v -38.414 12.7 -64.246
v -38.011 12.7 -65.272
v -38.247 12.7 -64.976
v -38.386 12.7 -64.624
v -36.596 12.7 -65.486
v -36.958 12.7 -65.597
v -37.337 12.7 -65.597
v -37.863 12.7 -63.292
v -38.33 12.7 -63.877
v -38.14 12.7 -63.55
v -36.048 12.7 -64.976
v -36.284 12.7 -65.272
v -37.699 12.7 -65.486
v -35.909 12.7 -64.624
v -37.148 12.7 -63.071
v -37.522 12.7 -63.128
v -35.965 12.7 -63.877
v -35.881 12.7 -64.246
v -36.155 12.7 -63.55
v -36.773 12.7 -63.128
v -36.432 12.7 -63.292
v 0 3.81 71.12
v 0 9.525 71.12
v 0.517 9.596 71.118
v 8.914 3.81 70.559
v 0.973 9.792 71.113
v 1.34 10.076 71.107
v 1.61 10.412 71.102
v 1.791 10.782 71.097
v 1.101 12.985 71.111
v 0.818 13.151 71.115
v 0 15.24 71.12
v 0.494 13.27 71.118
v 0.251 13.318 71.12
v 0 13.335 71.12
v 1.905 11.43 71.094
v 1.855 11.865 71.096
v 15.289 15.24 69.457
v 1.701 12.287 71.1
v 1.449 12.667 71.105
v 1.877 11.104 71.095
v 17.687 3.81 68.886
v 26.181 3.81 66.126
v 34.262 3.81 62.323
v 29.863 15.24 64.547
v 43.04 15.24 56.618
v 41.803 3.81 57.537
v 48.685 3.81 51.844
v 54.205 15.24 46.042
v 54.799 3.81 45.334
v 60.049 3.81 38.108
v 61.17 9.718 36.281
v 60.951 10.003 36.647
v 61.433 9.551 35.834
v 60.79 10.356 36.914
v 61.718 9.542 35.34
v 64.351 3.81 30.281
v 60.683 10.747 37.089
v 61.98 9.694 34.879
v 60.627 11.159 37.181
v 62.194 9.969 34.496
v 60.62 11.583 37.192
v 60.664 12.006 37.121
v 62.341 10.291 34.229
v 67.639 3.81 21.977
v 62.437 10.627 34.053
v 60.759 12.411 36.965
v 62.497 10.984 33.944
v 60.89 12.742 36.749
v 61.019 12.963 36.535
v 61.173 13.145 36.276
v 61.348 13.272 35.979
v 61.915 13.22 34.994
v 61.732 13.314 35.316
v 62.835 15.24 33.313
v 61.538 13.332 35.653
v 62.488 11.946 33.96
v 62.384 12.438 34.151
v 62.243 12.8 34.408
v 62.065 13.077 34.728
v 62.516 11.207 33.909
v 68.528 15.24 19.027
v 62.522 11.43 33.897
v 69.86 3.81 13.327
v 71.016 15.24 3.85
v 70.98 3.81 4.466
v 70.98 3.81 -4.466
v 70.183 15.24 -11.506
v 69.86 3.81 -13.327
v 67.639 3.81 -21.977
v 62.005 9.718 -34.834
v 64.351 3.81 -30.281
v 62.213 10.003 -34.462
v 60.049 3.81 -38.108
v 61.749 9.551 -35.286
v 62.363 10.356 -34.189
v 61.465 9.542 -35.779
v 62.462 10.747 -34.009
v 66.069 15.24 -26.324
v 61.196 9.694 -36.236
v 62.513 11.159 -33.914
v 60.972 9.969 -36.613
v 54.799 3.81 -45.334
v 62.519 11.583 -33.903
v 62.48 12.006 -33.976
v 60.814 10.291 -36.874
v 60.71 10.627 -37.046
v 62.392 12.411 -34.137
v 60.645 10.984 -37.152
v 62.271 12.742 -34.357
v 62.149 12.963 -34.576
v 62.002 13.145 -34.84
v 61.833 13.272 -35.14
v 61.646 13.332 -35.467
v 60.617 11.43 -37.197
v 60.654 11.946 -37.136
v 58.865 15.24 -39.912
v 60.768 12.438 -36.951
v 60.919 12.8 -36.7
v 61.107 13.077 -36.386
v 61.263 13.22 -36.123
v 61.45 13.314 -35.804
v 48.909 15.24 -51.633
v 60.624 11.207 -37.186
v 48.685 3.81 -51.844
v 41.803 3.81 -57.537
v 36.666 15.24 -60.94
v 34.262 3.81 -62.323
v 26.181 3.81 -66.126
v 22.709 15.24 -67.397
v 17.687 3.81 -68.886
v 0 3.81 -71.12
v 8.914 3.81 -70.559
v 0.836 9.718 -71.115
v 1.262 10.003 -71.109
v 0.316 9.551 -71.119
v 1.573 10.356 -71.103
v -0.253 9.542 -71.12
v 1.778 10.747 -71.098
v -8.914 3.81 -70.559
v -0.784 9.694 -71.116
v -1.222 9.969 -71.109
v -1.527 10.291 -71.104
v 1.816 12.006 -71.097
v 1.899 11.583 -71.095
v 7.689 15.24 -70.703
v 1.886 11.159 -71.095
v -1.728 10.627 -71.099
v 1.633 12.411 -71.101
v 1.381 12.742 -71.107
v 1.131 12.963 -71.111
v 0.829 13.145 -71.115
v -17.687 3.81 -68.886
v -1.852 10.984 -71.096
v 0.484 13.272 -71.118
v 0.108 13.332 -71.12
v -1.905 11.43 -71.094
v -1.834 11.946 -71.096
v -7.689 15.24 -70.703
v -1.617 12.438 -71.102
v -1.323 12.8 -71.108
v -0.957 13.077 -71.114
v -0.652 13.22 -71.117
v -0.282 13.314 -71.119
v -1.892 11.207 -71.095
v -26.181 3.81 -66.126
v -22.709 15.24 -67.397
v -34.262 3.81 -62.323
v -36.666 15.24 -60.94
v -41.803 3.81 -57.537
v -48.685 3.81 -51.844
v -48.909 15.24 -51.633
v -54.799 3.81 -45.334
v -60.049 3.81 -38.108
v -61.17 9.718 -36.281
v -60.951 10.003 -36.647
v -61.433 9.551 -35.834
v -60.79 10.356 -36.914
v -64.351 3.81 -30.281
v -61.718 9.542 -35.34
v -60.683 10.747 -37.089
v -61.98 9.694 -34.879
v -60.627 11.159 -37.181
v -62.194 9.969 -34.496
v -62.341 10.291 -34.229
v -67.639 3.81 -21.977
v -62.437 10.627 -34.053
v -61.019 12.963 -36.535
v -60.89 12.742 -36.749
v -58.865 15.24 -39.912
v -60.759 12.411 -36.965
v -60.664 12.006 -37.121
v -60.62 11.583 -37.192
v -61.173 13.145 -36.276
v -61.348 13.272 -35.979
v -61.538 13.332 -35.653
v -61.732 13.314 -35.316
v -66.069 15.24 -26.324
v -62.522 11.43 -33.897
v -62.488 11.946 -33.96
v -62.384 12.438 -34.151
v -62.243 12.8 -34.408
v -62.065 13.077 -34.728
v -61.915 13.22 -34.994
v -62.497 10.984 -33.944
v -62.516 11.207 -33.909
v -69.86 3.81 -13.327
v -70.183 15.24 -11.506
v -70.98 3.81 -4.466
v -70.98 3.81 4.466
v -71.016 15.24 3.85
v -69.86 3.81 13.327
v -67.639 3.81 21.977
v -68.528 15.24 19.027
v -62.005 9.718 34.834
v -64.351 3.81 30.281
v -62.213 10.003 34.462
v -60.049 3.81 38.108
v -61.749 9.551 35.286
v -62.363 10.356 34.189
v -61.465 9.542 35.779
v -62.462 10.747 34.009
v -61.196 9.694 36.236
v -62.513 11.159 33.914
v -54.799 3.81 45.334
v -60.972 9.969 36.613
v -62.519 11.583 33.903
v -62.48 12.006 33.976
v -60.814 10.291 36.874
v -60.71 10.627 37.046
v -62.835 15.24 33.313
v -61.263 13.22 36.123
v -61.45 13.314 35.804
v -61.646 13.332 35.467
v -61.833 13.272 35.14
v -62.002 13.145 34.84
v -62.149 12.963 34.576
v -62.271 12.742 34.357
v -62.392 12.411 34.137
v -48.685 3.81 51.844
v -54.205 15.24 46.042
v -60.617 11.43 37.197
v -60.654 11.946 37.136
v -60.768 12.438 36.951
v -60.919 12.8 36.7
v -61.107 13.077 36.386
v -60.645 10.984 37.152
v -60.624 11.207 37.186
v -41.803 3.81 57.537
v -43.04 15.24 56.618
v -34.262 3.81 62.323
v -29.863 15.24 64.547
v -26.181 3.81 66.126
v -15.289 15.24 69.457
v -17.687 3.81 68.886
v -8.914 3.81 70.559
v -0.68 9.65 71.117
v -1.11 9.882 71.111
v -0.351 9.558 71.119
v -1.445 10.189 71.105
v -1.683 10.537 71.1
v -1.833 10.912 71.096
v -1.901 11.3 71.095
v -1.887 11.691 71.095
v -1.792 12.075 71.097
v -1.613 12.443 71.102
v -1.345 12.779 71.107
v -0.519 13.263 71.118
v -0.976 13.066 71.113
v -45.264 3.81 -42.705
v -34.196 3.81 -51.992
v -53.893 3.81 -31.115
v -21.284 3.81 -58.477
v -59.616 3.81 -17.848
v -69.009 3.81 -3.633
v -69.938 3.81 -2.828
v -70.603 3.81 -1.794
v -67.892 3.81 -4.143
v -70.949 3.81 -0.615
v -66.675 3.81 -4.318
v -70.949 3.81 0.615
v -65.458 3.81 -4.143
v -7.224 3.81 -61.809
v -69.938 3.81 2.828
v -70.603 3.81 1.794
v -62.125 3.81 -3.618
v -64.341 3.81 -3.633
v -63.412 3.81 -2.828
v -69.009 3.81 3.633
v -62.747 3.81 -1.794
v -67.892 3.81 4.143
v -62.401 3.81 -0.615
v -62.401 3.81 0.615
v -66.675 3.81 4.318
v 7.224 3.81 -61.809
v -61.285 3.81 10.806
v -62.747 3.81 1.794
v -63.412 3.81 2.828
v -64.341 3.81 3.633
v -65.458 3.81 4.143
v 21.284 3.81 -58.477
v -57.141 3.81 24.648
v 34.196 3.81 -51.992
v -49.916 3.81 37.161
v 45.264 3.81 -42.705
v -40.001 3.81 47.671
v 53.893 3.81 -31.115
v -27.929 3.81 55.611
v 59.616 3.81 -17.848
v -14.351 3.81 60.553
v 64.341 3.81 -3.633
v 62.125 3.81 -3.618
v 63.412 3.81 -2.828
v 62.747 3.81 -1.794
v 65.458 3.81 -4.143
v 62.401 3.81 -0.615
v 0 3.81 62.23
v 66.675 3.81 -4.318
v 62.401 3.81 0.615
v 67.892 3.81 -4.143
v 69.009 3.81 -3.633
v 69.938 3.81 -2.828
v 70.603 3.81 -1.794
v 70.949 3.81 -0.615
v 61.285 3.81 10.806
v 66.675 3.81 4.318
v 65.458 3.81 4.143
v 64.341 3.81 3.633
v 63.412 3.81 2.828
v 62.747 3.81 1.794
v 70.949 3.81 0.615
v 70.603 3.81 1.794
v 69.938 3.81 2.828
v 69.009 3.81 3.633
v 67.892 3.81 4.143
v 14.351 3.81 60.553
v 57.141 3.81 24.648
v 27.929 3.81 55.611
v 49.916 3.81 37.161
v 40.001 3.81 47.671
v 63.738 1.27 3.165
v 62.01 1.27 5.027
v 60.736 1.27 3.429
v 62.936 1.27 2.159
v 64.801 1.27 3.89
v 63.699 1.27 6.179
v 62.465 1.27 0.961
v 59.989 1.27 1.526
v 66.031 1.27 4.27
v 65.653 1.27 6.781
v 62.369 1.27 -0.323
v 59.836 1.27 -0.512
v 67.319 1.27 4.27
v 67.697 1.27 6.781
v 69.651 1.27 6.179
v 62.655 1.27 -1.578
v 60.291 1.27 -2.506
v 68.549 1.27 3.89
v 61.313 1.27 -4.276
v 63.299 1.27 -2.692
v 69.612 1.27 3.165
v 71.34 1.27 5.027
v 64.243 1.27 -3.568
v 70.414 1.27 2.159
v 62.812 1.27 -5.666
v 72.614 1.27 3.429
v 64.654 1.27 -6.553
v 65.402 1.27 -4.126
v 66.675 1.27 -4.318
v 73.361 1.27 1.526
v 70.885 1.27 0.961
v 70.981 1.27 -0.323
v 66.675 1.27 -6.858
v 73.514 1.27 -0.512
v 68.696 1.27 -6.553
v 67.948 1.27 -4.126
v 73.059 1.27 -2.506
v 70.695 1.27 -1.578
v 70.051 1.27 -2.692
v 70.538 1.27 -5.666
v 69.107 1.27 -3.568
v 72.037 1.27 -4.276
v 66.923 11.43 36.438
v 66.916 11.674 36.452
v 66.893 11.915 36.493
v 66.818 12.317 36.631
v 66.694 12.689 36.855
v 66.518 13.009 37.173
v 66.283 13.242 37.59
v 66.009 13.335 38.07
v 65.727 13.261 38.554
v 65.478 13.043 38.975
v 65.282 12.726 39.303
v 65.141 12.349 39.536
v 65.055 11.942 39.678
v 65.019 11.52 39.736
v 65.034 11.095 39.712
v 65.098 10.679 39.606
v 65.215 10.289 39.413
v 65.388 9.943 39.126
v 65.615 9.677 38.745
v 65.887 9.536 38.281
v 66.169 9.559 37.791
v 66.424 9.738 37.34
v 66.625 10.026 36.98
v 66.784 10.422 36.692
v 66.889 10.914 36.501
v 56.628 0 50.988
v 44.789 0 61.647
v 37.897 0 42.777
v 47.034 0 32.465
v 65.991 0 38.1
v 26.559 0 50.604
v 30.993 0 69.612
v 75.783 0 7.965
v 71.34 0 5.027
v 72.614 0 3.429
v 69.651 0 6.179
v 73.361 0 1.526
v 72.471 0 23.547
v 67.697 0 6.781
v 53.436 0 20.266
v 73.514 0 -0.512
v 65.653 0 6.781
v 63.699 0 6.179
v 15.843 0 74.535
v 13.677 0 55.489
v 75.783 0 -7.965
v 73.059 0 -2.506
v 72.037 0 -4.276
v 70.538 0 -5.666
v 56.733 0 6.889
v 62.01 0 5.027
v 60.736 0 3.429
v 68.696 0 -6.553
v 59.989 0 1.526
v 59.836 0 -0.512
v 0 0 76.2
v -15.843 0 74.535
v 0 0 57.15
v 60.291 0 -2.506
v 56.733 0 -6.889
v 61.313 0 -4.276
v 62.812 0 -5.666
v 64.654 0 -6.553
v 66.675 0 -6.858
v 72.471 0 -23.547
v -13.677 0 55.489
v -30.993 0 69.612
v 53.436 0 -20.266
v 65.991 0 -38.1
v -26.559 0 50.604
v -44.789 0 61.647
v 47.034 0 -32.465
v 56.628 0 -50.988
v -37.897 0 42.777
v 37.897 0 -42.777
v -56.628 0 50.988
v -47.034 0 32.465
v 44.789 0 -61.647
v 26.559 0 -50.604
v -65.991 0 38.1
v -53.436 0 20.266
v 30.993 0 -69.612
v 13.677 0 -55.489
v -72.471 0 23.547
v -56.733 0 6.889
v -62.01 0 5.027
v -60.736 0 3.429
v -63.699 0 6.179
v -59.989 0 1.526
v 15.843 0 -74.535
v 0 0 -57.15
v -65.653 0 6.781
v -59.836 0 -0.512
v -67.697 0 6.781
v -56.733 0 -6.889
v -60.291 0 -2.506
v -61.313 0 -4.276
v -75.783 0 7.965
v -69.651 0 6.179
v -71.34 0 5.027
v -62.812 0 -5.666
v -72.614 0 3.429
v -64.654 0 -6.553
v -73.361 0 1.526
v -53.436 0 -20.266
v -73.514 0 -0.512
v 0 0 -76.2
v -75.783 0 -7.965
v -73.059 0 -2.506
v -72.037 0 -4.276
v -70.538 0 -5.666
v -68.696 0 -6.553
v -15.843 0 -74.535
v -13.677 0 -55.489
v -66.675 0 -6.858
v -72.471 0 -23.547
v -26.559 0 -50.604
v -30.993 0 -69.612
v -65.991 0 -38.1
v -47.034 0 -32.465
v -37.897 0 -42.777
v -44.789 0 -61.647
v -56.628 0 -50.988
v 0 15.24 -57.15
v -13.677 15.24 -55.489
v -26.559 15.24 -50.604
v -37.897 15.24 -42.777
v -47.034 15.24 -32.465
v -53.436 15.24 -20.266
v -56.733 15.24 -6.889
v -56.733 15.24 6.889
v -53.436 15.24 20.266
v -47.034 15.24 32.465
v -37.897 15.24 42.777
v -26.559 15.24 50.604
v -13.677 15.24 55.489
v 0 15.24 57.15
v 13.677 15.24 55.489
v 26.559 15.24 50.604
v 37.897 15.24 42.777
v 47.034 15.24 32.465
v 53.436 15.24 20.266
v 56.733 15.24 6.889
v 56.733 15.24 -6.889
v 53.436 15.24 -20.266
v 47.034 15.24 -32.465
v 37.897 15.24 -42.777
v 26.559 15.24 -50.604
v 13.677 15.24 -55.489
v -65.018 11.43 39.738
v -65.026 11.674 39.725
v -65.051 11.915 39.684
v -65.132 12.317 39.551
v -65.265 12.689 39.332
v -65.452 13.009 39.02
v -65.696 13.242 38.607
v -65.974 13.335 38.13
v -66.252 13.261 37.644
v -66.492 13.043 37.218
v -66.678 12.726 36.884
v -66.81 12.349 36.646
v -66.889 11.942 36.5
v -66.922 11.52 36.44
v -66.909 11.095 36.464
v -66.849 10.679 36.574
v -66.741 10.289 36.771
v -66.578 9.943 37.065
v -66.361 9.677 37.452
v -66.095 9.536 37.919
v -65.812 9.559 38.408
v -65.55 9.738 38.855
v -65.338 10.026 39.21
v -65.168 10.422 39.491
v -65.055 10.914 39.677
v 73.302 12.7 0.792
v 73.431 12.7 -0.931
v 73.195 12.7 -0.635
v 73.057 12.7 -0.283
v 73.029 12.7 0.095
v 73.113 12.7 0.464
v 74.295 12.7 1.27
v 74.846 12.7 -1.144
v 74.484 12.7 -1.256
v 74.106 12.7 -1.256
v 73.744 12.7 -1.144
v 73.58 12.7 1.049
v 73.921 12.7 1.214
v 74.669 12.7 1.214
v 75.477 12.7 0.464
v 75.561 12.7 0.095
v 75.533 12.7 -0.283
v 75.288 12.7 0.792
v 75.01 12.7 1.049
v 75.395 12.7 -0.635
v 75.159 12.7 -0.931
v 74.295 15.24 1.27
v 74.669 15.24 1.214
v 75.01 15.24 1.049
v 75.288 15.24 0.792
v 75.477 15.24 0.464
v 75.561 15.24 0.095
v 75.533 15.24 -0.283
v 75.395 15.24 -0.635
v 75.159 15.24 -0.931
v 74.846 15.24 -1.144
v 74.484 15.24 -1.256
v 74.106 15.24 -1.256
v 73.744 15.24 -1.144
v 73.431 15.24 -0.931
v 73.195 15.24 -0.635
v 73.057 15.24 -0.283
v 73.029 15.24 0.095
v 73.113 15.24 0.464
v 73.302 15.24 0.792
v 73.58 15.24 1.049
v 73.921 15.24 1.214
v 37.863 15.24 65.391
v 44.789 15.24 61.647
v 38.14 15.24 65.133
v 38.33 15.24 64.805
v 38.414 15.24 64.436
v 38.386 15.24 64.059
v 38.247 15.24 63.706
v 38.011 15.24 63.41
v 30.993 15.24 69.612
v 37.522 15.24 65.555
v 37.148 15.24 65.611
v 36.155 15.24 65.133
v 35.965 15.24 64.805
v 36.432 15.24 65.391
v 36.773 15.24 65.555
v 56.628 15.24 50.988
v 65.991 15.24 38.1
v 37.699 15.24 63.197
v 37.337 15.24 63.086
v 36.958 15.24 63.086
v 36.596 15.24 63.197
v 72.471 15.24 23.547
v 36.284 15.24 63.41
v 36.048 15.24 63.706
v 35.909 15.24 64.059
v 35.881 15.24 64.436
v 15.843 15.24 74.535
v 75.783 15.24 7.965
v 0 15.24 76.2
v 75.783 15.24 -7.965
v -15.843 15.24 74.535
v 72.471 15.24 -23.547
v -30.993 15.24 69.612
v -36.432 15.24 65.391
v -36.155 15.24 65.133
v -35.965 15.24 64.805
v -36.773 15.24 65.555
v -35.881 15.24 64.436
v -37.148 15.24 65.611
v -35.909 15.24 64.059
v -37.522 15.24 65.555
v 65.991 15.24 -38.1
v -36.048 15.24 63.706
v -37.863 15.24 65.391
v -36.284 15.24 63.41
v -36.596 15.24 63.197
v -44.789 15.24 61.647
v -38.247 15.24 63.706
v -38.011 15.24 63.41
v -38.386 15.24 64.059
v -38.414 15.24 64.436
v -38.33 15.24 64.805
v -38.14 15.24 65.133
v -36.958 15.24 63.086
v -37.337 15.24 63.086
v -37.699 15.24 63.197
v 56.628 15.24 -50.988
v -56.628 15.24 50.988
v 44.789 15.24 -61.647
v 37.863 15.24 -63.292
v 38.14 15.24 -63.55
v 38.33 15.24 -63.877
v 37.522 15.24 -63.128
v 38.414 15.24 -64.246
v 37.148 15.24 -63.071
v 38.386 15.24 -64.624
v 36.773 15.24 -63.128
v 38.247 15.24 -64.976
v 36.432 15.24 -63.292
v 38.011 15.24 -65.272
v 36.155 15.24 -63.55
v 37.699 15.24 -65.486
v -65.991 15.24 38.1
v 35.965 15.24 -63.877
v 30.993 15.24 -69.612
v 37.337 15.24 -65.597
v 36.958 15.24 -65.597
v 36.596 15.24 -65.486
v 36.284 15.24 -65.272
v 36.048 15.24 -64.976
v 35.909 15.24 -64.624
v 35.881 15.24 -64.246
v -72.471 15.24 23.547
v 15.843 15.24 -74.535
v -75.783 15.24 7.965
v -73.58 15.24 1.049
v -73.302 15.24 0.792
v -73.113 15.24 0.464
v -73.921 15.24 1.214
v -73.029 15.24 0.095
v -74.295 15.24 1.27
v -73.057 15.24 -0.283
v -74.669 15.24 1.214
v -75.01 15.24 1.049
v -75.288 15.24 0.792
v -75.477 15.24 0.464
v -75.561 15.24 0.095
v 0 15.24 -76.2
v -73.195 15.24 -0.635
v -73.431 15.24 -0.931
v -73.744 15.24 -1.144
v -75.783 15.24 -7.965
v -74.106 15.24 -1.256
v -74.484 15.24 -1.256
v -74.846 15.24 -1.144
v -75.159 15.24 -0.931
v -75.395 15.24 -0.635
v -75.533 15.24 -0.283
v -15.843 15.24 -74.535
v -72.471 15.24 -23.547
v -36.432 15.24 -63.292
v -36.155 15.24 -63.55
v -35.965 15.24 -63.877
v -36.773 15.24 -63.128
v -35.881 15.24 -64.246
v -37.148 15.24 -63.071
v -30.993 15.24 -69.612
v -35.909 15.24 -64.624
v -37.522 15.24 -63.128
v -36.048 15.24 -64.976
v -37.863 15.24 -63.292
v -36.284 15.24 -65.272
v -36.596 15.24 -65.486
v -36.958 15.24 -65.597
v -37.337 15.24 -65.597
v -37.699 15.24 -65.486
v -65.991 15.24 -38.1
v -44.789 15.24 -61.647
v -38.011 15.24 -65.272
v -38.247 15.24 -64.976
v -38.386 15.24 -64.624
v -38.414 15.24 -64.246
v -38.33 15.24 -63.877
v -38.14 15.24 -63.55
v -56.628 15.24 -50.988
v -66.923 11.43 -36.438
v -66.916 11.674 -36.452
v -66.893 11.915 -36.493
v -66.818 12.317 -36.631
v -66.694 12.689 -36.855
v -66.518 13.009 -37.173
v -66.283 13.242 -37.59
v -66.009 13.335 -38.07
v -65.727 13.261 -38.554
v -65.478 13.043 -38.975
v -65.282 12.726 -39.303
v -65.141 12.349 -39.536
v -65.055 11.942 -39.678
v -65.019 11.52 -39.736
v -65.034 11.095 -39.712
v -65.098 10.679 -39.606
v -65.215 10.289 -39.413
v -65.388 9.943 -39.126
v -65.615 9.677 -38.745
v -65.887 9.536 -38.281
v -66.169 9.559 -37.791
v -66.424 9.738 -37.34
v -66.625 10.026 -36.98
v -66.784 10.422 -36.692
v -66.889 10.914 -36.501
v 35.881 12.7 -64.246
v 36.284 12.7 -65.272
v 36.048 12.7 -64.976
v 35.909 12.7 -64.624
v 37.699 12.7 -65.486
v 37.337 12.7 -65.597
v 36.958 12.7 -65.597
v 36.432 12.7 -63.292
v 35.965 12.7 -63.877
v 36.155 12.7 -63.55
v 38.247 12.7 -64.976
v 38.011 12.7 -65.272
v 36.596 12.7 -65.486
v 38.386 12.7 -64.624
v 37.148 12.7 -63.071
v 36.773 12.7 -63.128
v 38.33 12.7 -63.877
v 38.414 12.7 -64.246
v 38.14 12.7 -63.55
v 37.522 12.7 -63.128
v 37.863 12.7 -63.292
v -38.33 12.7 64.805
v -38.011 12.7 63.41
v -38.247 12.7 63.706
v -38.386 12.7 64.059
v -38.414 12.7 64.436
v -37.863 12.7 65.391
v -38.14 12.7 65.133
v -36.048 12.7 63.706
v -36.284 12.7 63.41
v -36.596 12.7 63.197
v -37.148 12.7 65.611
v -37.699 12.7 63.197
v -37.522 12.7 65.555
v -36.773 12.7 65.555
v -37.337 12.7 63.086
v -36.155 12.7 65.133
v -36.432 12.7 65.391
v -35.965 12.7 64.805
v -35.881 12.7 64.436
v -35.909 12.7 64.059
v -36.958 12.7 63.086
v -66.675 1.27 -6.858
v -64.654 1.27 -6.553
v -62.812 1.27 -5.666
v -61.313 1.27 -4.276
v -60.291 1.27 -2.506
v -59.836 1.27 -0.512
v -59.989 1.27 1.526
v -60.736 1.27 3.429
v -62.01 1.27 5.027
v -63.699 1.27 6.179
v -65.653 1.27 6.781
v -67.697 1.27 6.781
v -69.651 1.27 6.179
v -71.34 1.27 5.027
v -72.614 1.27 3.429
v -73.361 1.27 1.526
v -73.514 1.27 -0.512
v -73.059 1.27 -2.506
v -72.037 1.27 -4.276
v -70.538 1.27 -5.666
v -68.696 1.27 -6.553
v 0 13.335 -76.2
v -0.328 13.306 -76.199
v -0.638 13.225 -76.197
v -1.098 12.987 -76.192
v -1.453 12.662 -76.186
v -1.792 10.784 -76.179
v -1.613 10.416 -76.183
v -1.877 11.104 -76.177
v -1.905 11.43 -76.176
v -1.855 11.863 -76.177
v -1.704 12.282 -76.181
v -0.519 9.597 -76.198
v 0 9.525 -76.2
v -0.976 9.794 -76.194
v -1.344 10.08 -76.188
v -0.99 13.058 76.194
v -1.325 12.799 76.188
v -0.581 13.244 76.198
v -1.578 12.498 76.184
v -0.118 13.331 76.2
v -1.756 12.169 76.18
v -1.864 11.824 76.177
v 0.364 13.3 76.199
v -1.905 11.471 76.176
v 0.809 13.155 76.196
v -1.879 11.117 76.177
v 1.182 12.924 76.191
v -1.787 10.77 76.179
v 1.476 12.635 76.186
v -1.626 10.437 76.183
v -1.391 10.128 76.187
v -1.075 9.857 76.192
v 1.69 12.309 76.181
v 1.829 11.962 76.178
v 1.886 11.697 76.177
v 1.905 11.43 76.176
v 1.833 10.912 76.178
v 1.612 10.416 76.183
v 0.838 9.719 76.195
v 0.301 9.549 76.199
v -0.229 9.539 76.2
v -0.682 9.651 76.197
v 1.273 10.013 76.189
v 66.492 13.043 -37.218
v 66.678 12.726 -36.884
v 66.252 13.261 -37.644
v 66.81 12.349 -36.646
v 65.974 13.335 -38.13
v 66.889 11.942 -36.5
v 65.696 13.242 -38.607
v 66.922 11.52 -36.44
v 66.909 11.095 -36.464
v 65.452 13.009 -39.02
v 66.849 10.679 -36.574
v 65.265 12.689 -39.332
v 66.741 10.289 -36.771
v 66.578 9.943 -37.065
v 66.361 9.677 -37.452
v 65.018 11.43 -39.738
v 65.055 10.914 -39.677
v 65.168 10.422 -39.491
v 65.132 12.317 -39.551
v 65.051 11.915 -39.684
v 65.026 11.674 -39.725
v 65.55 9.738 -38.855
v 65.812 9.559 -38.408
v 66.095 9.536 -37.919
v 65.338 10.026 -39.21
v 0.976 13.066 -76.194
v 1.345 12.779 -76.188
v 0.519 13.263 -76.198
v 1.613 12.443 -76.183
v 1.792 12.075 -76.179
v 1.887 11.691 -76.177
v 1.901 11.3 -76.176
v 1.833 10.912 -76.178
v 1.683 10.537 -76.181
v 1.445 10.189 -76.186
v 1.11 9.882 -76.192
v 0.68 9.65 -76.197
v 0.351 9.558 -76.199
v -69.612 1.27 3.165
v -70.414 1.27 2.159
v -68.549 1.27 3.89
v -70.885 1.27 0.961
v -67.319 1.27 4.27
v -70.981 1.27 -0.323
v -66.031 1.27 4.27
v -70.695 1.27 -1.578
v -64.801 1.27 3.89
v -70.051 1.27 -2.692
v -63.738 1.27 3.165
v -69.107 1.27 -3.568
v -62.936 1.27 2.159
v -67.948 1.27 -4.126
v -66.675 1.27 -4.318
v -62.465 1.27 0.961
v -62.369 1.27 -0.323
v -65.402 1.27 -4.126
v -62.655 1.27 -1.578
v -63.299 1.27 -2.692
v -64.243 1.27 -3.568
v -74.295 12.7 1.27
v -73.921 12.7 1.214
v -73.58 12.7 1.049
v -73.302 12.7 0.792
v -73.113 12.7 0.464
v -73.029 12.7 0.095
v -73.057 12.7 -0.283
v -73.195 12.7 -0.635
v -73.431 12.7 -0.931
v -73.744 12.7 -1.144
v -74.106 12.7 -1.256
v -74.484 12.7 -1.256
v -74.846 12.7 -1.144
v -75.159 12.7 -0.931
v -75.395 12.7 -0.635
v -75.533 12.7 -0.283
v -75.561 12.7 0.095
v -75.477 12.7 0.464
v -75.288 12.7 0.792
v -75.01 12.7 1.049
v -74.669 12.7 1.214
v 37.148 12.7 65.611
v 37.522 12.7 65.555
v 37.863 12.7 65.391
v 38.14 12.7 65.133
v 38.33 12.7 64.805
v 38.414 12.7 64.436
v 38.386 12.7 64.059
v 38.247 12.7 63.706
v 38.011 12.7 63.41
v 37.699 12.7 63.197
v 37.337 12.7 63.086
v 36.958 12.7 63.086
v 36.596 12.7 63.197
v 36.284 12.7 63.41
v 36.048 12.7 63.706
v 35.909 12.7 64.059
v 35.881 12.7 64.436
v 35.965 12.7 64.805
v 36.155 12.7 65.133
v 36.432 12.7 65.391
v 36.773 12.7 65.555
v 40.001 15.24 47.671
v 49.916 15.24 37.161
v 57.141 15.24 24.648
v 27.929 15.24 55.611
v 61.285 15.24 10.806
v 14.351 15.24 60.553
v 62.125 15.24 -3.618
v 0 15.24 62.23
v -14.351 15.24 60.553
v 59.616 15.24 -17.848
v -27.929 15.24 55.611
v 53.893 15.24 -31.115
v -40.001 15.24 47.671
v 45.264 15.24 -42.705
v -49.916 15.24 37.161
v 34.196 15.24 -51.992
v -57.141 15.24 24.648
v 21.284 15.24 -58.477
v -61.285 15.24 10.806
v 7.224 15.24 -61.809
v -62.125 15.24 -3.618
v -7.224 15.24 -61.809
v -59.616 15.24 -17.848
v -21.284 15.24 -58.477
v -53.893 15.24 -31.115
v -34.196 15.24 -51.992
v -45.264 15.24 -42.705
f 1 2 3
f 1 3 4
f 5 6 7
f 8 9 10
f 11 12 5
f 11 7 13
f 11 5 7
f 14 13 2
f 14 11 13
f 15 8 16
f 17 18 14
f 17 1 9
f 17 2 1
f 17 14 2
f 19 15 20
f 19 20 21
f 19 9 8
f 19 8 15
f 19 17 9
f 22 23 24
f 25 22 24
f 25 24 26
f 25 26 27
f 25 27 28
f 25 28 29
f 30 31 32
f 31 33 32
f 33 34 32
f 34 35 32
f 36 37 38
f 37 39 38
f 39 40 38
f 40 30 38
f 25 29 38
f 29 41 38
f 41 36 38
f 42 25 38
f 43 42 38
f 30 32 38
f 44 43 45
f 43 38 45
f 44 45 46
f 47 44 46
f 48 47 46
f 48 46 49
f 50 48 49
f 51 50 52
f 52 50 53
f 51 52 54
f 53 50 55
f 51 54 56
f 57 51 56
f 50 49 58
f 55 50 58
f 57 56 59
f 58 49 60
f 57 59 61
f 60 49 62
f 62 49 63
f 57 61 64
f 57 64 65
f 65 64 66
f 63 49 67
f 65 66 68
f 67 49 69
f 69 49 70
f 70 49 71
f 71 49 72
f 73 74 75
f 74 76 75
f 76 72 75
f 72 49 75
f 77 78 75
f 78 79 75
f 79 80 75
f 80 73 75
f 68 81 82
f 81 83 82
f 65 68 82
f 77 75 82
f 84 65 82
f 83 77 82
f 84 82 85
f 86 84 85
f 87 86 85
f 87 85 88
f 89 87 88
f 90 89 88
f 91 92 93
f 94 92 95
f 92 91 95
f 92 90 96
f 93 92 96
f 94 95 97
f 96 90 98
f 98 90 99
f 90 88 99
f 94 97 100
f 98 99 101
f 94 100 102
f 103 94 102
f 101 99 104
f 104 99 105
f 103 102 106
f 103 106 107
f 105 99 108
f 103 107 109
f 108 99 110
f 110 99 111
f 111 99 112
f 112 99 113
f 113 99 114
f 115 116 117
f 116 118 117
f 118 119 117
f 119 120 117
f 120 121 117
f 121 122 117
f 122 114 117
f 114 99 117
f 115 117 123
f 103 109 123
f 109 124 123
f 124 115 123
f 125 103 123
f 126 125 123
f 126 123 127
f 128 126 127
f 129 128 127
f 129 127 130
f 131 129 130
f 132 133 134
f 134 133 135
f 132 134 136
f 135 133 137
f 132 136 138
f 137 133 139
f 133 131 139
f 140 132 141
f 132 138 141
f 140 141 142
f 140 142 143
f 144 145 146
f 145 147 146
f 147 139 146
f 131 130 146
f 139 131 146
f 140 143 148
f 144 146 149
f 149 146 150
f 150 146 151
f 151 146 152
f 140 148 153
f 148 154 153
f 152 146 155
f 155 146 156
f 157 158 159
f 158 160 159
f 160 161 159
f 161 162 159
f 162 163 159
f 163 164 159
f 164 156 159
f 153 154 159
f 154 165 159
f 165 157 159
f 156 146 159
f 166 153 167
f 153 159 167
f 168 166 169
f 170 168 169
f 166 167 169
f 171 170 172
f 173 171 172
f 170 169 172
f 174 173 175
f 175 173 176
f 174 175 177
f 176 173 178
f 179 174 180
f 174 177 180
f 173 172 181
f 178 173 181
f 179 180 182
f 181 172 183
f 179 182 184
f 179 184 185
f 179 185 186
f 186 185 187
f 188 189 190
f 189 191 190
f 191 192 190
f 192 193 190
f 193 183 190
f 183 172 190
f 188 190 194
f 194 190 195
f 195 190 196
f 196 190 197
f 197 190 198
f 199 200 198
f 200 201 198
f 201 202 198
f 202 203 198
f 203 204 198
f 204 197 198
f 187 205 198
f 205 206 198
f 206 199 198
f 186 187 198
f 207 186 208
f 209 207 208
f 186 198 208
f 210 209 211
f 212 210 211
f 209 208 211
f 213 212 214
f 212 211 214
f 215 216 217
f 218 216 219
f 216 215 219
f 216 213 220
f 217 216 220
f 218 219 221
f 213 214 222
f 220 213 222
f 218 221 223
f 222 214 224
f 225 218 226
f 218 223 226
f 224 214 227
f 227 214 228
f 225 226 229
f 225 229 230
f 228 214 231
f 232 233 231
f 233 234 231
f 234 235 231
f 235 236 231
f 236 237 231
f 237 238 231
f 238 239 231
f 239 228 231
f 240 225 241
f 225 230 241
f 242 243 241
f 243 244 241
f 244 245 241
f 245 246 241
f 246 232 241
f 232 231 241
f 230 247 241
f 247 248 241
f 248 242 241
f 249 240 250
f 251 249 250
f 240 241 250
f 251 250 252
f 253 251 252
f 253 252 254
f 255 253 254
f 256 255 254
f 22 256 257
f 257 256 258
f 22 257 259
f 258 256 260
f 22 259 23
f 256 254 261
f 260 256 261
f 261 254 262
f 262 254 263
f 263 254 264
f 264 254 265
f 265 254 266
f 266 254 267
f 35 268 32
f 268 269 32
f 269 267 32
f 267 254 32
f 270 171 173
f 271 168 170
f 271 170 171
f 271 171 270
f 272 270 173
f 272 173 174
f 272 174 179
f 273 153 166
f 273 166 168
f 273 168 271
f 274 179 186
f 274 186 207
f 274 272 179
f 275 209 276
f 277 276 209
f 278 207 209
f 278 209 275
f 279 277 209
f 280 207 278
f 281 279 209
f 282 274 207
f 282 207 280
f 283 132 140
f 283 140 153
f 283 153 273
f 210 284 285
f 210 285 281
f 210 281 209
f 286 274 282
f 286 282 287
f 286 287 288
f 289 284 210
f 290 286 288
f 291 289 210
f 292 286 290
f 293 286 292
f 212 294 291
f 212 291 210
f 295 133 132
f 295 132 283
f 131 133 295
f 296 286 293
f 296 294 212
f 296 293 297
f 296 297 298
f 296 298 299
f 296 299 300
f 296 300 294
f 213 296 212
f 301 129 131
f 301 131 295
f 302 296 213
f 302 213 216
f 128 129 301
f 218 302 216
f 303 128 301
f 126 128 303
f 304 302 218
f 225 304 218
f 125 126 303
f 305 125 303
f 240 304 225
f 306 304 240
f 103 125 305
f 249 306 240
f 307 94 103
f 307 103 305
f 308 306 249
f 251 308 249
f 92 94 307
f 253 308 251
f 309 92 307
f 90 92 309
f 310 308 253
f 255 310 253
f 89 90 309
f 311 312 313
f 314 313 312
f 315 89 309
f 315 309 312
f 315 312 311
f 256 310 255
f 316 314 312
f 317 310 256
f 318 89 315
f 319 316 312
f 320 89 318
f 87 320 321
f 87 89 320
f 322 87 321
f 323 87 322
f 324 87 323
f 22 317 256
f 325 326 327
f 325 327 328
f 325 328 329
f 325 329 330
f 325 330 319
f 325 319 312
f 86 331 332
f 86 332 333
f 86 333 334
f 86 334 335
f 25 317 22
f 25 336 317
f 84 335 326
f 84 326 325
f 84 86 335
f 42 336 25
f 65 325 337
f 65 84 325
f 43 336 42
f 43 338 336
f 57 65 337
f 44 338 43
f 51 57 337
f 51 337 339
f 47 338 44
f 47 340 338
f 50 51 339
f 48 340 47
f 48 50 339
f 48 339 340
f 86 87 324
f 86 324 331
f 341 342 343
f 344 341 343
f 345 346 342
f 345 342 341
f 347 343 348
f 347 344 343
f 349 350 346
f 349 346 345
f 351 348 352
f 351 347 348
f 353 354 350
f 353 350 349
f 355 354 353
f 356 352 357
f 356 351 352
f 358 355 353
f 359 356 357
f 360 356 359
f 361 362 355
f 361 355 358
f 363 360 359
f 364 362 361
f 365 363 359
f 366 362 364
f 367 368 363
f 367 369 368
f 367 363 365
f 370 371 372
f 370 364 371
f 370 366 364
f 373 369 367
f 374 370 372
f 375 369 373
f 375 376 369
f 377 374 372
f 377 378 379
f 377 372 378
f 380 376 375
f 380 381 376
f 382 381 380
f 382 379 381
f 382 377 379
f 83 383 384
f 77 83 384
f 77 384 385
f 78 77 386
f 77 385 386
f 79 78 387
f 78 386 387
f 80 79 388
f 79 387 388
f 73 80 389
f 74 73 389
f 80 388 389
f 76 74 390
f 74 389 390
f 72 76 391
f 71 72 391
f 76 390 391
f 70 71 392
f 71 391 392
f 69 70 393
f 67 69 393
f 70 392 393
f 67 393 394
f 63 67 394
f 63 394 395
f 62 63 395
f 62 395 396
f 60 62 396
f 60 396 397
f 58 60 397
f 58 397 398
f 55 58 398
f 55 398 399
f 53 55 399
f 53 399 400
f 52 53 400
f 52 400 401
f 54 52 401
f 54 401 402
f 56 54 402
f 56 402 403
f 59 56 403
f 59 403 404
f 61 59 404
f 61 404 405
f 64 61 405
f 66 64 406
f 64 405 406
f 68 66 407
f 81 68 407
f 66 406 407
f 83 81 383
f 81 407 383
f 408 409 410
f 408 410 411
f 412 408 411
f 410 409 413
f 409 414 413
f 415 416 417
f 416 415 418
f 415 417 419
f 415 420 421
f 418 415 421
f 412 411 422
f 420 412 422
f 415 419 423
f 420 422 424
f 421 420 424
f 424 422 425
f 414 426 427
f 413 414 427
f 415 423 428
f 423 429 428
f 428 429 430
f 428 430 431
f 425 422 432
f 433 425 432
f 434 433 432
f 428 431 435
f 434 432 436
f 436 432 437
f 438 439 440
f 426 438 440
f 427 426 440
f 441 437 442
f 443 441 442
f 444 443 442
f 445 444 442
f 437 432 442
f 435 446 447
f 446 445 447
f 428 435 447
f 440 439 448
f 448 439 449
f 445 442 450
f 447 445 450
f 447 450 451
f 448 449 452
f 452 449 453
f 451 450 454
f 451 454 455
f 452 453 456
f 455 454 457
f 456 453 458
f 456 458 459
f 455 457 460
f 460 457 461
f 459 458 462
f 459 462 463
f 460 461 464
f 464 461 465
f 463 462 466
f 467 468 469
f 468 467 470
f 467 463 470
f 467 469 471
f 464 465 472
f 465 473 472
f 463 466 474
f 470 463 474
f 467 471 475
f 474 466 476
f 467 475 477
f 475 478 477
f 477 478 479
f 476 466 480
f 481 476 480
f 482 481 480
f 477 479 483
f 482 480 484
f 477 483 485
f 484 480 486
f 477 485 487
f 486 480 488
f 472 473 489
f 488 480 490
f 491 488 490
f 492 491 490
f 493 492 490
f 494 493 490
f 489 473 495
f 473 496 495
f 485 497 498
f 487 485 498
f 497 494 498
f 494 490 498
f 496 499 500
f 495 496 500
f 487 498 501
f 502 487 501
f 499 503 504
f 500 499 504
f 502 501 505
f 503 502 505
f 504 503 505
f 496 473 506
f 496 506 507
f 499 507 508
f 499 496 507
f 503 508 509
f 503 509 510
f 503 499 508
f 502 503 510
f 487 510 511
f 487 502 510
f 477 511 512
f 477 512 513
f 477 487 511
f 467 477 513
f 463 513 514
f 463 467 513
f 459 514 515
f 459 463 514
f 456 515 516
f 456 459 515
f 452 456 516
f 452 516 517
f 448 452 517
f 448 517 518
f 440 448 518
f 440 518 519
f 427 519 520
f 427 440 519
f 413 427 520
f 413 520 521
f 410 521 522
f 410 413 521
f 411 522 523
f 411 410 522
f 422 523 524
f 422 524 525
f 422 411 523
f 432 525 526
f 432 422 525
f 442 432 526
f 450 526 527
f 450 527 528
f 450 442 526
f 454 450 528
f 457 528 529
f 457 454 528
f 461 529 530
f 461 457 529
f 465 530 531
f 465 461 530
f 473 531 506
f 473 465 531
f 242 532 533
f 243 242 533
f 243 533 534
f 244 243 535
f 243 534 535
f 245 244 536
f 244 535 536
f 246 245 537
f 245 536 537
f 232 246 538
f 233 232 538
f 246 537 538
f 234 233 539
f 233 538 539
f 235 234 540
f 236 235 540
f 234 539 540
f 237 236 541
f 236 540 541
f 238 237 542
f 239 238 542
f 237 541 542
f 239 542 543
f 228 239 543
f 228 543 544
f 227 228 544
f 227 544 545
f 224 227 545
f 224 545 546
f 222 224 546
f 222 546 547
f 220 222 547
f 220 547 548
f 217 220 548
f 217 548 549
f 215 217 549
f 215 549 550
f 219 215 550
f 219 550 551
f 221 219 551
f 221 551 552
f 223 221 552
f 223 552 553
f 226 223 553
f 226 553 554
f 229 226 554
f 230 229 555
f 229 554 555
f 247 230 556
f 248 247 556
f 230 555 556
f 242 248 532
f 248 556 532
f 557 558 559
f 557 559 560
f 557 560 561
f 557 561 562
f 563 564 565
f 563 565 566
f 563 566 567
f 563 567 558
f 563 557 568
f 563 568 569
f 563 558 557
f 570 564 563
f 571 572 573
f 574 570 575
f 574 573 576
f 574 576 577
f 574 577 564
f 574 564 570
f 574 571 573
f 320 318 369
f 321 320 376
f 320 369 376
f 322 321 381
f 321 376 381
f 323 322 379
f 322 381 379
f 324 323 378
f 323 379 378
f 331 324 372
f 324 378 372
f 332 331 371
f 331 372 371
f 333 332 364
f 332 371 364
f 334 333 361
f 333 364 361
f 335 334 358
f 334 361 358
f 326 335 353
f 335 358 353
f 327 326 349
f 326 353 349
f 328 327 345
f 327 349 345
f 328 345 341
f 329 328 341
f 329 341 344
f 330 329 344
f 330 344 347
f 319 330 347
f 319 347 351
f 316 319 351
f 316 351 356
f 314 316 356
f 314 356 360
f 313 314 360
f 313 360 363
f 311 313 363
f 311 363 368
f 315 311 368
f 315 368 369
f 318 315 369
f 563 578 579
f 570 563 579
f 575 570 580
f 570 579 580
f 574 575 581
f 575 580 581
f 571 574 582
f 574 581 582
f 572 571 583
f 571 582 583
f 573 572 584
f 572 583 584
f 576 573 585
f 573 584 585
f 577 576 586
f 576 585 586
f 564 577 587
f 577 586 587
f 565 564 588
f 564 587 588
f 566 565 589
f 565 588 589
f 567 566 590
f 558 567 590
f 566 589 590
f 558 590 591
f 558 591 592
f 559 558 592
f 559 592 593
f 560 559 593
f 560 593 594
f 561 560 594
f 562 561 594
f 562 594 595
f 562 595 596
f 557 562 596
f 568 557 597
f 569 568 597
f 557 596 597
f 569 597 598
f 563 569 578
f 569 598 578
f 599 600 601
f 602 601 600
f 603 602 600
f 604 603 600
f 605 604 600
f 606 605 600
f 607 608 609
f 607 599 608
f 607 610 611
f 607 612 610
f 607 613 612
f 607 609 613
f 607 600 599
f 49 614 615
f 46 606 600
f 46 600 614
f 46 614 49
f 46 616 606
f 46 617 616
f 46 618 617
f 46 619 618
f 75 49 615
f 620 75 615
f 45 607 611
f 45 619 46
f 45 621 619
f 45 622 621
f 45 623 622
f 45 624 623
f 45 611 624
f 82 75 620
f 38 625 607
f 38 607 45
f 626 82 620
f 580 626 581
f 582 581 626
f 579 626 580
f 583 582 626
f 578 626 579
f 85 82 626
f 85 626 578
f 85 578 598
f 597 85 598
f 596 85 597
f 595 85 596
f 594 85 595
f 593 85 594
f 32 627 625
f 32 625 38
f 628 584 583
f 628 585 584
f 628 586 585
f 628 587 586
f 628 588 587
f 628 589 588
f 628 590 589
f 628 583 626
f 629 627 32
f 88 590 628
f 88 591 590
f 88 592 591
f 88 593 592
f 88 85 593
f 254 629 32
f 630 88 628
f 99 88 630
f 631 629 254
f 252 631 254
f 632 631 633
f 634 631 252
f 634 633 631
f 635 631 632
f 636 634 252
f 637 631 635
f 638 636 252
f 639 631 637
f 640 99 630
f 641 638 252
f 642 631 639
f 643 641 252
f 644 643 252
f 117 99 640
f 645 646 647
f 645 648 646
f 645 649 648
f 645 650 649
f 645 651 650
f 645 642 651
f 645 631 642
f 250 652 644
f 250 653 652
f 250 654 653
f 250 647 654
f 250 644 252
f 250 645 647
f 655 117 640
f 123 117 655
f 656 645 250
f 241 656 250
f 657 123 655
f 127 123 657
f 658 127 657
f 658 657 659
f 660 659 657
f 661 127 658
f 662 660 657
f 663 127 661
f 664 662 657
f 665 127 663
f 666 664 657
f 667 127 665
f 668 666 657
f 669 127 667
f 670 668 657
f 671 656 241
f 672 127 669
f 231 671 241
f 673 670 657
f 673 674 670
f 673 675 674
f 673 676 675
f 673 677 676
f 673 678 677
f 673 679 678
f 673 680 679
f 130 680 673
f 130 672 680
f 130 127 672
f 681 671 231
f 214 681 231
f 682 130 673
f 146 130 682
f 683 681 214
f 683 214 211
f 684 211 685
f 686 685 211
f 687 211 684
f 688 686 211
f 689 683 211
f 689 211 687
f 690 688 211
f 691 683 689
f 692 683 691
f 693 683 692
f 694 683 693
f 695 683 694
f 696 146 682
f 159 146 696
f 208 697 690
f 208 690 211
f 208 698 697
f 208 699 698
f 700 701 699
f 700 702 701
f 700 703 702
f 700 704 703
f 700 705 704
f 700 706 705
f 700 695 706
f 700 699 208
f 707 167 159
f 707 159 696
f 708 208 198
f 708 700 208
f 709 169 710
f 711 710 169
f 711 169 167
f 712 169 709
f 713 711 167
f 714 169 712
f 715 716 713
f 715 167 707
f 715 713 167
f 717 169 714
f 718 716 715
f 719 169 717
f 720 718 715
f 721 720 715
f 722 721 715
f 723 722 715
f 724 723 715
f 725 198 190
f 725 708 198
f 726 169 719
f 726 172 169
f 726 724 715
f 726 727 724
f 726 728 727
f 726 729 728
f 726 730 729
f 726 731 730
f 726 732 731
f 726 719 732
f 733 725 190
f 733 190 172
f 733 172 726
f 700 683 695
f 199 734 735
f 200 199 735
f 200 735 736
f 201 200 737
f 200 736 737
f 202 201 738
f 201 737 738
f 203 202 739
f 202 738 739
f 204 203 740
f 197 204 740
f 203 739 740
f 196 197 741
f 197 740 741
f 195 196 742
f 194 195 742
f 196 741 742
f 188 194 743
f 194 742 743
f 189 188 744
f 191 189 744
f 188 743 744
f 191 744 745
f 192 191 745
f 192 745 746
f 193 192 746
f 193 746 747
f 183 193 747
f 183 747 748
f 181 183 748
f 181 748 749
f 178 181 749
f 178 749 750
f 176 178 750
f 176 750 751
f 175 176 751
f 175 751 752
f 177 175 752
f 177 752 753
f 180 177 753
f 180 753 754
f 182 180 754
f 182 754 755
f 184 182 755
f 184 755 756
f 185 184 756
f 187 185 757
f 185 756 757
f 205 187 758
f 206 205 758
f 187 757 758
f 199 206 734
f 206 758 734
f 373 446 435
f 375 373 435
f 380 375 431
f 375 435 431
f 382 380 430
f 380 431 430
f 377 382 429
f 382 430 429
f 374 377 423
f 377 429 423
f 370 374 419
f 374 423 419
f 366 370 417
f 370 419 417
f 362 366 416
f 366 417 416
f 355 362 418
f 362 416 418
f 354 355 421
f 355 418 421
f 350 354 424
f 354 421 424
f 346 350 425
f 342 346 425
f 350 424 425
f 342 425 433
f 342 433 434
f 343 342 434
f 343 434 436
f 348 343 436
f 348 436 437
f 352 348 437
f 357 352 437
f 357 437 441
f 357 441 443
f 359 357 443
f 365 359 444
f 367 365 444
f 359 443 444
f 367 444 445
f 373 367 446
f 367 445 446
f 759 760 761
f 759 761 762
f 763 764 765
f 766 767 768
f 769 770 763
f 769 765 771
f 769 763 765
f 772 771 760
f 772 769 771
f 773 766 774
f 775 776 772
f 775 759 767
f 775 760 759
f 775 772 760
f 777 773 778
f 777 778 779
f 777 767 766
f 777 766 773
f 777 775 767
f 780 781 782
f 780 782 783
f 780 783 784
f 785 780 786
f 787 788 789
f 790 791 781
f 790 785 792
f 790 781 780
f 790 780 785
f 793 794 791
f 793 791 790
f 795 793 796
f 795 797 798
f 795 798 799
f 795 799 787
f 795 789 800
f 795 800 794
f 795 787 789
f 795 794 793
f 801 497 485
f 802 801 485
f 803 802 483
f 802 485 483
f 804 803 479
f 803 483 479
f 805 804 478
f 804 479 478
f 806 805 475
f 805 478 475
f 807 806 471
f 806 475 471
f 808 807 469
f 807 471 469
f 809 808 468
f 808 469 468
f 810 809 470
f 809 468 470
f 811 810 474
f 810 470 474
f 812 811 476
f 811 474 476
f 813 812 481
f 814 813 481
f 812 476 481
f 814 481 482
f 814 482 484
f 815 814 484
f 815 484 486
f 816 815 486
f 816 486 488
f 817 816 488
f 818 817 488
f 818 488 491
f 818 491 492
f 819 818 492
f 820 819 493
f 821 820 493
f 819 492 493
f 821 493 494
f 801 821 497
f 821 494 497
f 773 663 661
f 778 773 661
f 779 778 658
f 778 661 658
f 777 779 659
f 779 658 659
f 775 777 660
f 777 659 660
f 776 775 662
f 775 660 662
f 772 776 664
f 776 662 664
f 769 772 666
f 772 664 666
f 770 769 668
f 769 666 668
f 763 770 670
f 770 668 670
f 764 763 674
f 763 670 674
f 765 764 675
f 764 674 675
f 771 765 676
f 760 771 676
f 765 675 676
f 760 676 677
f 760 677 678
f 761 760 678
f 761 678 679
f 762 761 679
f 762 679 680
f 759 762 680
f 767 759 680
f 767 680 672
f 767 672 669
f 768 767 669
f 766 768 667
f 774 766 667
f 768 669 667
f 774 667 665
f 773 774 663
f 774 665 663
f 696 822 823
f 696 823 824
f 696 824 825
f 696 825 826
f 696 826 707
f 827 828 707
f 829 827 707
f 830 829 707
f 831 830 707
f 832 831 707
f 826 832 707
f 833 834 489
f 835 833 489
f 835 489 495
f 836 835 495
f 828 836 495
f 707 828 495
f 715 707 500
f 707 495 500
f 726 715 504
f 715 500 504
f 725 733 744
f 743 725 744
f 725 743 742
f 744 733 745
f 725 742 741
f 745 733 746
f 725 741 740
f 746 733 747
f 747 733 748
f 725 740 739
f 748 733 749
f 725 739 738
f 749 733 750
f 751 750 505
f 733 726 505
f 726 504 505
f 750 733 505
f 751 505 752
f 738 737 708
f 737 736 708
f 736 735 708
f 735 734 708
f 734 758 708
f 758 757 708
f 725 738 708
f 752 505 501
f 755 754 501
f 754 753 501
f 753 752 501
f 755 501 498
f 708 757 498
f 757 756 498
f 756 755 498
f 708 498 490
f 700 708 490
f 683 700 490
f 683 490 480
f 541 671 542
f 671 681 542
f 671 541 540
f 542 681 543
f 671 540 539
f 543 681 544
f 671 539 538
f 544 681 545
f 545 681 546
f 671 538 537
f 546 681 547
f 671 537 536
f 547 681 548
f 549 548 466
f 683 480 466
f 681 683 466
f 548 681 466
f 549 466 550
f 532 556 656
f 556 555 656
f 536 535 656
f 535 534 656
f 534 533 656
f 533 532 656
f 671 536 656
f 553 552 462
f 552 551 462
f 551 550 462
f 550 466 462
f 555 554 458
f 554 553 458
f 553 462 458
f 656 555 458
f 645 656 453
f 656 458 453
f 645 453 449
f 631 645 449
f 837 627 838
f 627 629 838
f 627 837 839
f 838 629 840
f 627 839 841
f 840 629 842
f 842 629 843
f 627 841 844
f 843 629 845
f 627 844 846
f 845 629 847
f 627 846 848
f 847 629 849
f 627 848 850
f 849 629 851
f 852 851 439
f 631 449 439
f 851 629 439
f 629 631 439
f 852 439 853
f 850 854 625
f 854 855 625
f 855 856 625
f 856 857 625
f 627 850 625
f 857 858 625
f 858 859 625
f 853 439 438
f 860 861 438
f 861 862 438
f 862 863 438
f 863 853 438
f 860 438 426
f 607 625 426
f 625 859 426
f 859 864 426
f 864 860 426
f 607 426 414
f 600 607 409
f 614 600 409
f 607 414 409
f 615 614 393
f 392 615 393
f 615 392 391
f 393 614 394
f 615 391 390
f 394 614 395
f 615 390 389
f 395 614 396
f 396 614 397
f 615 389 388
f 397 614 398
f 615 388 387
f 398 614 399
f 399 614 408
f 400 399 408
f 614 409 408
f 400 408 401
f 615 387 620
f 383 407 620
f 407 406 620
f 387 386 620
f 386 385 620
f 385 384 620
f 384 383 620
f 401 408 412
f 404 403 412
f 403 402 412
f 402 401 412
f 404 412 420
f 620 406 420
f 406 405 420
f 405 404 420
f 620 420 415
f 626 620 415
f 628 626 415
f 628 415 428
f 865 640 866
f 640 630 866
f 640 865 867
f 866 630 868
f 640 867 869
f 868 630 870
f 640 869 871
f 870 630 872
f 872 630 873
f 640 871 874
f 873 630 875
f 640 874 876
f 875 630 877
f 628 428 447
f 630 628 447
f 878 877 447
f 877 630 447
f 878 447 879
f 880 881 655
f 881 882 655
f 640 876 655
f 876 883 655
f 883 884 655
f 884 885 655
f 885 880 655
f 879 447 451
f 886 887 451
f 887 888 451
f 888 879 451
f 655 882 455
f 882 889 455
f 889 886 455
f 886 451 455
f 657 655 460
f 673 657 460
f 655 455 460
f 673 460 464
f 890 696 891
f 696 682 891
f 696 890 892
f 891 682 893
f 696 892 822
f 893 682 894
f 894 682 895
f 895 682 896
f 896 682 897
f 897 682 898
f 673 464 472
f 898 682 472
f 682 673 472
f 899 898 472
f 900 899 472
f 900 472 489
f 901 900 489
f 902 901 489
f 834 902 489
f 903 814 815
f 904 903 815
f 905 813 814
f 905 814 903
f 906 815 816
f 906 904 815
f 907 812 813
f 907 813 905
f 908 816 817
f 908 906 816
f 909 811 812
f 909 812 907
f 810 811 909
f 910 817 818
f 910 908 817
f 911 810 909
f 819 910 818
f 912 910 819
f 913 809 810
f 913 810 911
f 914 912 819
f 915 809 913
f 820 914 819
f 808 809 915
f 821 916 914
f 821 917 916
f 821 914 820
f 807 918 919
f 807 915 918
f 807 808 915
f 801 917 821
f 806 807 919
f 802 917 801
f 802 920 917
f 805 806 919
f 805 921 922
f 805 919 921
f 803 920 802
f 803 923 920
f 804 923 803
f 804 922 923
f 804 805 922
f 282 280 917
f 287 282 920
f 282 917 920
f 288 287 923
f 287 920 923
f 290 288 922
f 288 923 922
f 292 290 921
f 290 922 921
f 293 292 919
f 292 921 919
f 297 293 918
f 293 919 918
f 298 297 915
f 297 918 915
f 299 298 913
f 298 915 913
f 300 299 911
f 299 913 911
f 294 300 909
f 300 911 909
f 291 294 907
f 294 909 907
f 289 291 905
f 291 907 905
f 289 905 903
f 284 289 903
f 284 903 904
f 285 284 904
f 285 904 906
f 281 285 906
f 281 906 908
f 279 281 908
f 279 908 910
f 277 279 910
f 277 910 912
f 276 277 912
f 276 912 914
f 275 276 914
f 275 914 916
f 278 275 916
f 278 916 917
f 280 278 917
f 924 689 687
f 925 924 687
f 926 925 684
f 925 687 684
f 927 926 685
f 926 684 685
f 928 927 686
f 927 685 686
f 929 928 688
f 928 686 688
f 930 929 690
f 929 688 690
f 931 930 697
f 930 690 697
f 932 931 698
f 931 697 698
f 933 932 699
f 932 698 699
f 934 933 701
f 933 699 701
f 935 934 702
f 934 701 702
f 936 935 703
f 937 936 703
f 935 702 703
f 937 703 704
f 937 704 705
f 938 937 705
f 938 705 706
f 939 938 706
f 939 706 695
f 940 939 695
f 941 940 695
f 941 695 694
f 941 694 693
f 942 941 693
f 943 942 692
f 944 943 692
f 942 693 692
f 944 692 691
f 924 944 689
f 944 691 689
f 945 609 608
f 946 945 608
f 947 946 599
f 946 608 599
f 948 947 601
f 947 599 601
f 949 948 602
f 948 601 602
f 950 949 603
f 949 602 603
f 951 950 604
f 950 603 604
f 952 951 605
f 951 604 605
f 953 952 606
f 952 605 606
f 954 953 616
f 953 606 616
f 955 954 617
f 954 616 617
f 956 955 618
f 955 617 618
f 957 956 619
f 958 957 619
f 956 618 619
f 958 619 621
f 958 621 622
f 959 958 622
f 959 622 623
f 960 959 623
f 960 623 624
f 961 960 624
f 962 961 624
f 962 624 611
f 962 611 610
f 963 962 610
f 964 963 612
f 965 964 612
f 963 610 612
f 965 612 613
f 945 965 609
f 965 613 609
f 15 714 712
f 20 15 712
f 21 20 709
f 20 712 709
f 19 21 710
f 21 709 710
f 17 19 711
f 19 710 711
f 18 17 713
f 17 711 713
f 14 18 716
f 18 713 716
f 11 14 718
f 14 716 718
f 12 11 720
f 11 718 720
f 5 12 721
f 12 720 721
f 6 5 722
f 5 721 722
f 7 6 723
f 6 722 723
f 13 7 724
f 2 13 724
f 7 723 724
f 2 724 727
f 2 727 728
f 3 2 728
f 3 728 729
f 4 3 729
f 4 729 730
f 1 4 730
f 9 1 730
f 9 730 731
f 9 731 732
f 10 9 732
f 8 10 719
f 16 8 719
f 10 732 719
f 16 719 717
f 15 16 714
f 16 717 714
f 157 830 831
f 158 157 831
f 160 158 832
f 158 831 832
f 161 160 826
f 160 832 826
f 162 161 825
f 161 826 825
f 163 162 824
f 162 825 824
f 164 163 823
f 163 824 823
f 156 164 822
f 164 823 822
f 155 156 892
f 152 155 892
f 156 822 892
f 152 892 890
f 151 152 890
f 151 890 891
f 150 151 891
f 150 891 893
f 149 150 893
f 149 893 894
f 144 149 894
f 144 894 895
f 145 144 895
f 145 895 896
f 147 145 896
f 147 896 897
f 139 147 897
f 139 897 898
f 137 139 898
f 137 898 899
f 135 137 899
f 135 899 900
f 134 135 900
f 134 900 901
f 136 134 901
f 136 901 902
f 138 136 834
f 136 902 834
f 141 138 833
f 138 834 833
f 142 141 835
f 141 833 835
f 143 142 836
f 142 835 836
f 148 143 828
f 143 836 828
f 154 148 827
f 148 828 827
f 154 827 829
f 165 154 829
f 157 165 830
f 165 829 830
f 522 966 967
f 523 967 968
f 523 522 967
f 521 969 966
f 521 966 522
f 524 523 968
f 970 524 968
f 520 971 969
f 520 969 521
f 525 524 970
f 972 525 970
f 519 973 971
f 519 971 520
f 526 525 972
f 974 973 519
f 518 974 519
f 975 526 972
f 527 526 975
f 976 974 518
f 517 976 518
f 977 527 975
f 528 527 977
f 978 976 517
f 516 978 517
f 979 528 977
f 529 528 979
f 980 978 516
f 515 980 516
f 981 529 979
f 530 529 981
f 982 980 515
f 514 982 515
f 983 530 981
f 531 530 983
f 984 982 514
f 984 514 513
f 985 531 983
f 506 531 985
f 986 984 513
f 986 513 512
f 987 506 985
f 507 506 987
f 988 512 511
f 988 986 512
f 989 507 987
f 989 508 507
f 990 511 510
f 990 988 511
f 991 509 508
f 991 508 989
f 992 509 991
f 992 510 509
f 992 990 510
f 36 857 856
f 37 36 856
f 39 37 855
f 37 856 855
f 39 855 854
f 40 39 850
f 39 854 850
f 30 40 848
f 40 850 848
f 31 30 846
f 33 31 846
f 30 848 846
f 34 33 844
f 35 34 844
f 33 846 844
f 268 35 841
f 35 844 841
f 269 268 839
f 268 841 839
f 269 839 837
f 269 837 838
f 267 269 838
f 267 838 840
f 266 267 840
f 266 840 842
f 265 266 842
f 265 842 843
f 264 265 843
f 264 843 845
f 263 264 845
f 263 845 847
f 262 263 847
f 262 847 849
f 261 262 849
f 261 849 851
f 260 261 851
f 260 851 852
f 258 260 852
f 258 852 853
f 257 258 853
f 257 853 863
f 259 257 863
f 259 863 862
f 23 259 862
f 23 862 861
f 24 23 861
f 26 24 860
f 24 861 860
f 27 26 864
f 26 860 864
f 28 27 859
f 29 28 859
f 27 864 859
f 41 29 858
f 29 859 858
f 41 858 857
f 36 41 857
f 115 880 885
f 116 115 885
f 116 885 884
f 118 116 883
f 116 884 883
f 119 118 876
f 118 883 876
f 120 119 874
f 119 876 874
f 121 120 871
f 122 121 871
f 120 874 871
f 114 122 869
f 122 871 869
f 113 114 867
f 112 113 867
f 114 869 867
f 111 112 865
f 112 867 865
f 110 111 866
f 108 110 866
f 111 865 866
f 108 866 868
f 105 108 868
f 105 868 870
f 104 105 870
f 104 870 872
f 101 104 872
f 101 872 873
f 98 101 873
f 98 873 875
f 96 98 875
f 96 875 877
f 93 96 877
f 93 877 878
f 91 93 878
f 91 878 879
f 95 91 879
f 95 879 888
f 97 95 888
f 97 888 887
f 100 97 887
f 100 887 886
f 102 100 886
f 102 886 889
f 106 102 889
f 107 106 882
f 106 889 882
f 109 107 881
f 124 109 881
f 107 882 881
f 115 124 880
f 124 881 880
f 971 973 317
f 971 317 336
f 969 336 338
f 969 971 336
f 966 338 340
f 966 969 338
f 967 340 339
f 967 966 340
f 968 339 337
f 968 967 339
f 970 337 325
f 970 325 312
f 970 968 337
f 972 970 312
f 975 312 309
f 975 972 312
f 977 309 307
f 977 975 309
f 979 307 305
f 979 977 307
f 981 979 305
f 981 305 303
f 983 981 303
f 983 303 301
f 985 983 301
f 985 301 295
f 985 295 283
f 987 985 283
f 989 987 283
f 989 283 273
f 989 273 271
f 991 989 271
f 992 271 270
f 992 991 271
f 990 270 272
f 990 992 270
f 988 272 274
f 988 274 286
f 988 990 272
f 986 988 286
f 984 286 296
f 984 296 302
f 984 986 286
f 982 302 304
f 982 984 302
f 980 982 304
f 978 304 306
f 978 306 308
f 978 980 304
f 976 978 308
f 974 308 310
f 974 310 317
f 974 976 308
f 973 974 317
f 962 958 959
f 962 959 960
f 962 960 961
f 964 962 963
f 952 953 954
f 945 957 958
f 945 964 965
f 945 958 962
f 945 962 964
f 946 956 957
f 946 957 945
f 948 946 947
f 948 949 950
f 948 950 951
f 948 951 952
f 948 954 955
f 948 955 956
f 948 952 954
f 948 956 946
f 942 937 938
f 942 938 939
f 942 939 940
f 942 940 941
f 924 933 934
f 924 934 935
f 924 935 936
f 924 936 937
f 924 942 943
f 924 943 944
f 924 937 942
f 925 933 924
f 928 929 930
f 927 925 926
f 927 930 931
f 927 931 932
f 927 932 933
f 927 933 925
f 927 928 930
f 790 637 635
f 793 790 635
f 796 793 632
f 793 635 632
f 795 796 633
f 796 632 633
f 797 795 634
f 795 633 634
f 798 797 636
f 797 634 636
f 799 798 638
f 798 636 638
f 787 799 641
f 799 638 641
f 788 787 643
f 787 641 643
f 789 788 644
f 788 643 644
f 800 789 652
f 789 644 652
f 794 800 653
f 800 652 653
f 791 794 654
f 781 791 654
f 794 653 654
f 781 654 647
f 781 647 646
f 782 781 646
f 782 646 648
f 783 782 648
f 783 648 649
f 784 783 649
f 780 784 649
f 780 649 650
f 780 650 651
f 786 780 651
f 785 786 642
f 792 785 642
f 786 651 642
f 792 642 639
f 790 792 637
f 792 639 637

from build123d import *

# Parameters (mm, degrees)
SKETCH1_R               = 76.2
SKETCH1_R_2             = 57.15
BOSS_EXTRUDE1_DEPTH     = 15.24
SKETCH2_R               = 71.12
SKETCH2_R_2             = 62.23
CUT_EXTRUDE1_DEPTH      = 11.43
CUT_EXTRUDE2_REACH      = 110.835
SKETCH3_R               = 4.318
SKETCH4_R               = 6.858
CUT_EXTRUDE3_DEPTH      = 1.27
CUT_EXTRUDE4_REACH      = 173.069
CUT_EXTRUDE4_END_RADIUS = 71.12
SKETCH5_R               = 1.905
CIRPATTERN1_COUNT       = 6
SKETCH6_R               = 1.27
CUT_EXTRUDE5_DEPTH      = 2.54


with BuildPart() as part:
    # Sketch1 → Boss-Extrude1 (new body)
    with BuildSketch(Plane(origin=(0, 0, 0), x_dir=(1, 0, 0), z_dir=(0, 1, 0))):
        with Locations(Location((0, 0, 0), (0, 0, 90))):
            Circle(SKETCH1_R)
        with Locations(Location((0, 0, 0), (0, 0, 90))):
            Circle(SKETCH1_R_2, mode=Mode.SUBTRACT)
    extrude(amount=BOSS_EXTRUDE1_DEPTH)

    # Sketch2 → Cut-Extrude1 (cut)
    with BuildSketch(Plane(origin=(0, 15.24, 0), x_dir=(1, 0, 0), z_dir=(0, 1, 0))):
        with Locations(Location((0, 0, 0), (0, 0, 270))):
            Circle(SKETCH2_R)
        with Locations(Location((0, 0, 0), (0, 0, 270))):
            Circle(SKETCH2_R_2, mode=Mode.SUBTRACT)
    extrude(amount=-CUT_EXTRUDE1_DEPTH, mode=Mode.SUBTRACT)

    # Sketch3 → Cut-Extrude2 (cut, up to next)
    with BuildSketch(Plane.XZ, mode=Mode.PRIVATE) as cut_extrude2_sk1:
        with Locations(Location((-66.675, 0, 0), (0, 0, 270))):
            Circle(SKETCH3_R)
    cut_extrude2_tool1 = extrude(cut_extrude2_sk1.sketch, amount=-CUT_EXTRUDE2_REACH, mode=Mode.PRIVATE) & part.part
    # Sketch3 → Cut-Extrude2 (cut, up to next)
    with BuildSketch(Plane.XZ, mode=Mode.PRIVATE) as cut_extrude2_sk2:
        with Locations(Location((66.675, 0, 0), (0, 0, 270))):
            Circle(SKETCH3_R)
    cut_extrude2_tool2 = extrude(cut_extrude2_sk2.sketch, amount=-CUT_EXTRUDE2_REACH, mode=Mode.PRIVATE) & part.part
    add(cut_extrude2_tool1.solids().sort_by_distance((-66.675, 0, 0))[0], mode=Mode.SUBTRACT)
    add(cut_extrude2_tool2.solids().sort_by_distance((66.675, 0, 0))[0], mode=Mode.SUBTRACT)

    # Sketch4 → Cut-Extrude3 (cut)
    with BuildSketch(Plane.XZ):
        with Locations(Location((-66.675, 0, 0), (0, 0, 270))):
            Circle(SKETCH4_R)
        with Locations(Location((66.675, 0, 0), (0, 0, 270))):
            Circle(SKETCH4_R)
    extrude(amount=-CUT_EXTRUDE3_DEPTH, mode=Mode.SUBTRACT)

    # Cut-Extrude4: up to this cylinder (the profile starts outside it)
    cut_extrude4_end = Plane(origin=(0, 11.43, 0), z_dir=(0, 1, 0)) * Cylinder(CUT_EXTRUDE4_END_RADIUS, 489.378, mode=Mode.PRIVATE)
    # Sketch5 → Cut-Extrude4 (cut, up to the surface)
    with BuildSketch(Plane.XY.offset(76.2), mode=Mode.PRIVATE) as cut_extrude4_sk1:
        with Locations((0, 11.43)):
            Circle(SKETCH5_R)
    cut_extrude4_tool1 = extrude(cut_extrude4_sk1.sketch, amount=-CUT_EXTRUDE4_REACH, mode=Mode.PRIVATE) - cut_extrude4_end
    cut_extrude4 = cut_extrude4_tool1.solids().sort_by_distance((0, 11.43, 76.2))[0]
    add(cut_extrude4, mode=Mode.SUBTRACT)

    # CirPattern1: Cut-Extrude4 ×6 about axis
    cirpattern1_axis = Axis((0, 15.24, 0), (0, -1, 0))
    for i in range(1, CIRPATTERN1_COUNT):
        add(cut_extrude4.rotate(cirpattern1_axis, i * 360 / CIRPATTERN1_COUNT), mode=Mode.SUBTRACT)

    # Sketch6 → Cut-Extrude5 (cut)
    with BuildSketch(Plane(origin=(0, 15.24, 0), x_dir=(1, 0, 0), z_dir=(0, 1, 0))):
        with Locations(Location((37.1475, 64.341357374, 0), (0, 0, 270))):
            Circle(SKETCH6_R)
        with Locations(Location((74.295, 0, 0), (0, 0, 270))):
            Circle(SKETCH6_R)
        with Locations(Location((37.1475, -64.341357374, 0), (0, 0, 270))):
            Circle(SKETCH6_R)
        with Locations(Location((-37.1475, -64.341357374, 0), (0, 0, 270))):
            Circle(SKETCH6_R)
        with Locations(Location((-74.295, 0, 0), (0, 0, 270))):
            Circle(SKETCH6_R)
        with Locations(Location((-37.1475, 64.341357374, 0), (0, 0, 270))):
            Circle(SKETCH6_R)
    extrude(amount=-CUT_EXTRUDE5_DEPTH, mode=Mode.SUBTRACT)


solid = part.part
